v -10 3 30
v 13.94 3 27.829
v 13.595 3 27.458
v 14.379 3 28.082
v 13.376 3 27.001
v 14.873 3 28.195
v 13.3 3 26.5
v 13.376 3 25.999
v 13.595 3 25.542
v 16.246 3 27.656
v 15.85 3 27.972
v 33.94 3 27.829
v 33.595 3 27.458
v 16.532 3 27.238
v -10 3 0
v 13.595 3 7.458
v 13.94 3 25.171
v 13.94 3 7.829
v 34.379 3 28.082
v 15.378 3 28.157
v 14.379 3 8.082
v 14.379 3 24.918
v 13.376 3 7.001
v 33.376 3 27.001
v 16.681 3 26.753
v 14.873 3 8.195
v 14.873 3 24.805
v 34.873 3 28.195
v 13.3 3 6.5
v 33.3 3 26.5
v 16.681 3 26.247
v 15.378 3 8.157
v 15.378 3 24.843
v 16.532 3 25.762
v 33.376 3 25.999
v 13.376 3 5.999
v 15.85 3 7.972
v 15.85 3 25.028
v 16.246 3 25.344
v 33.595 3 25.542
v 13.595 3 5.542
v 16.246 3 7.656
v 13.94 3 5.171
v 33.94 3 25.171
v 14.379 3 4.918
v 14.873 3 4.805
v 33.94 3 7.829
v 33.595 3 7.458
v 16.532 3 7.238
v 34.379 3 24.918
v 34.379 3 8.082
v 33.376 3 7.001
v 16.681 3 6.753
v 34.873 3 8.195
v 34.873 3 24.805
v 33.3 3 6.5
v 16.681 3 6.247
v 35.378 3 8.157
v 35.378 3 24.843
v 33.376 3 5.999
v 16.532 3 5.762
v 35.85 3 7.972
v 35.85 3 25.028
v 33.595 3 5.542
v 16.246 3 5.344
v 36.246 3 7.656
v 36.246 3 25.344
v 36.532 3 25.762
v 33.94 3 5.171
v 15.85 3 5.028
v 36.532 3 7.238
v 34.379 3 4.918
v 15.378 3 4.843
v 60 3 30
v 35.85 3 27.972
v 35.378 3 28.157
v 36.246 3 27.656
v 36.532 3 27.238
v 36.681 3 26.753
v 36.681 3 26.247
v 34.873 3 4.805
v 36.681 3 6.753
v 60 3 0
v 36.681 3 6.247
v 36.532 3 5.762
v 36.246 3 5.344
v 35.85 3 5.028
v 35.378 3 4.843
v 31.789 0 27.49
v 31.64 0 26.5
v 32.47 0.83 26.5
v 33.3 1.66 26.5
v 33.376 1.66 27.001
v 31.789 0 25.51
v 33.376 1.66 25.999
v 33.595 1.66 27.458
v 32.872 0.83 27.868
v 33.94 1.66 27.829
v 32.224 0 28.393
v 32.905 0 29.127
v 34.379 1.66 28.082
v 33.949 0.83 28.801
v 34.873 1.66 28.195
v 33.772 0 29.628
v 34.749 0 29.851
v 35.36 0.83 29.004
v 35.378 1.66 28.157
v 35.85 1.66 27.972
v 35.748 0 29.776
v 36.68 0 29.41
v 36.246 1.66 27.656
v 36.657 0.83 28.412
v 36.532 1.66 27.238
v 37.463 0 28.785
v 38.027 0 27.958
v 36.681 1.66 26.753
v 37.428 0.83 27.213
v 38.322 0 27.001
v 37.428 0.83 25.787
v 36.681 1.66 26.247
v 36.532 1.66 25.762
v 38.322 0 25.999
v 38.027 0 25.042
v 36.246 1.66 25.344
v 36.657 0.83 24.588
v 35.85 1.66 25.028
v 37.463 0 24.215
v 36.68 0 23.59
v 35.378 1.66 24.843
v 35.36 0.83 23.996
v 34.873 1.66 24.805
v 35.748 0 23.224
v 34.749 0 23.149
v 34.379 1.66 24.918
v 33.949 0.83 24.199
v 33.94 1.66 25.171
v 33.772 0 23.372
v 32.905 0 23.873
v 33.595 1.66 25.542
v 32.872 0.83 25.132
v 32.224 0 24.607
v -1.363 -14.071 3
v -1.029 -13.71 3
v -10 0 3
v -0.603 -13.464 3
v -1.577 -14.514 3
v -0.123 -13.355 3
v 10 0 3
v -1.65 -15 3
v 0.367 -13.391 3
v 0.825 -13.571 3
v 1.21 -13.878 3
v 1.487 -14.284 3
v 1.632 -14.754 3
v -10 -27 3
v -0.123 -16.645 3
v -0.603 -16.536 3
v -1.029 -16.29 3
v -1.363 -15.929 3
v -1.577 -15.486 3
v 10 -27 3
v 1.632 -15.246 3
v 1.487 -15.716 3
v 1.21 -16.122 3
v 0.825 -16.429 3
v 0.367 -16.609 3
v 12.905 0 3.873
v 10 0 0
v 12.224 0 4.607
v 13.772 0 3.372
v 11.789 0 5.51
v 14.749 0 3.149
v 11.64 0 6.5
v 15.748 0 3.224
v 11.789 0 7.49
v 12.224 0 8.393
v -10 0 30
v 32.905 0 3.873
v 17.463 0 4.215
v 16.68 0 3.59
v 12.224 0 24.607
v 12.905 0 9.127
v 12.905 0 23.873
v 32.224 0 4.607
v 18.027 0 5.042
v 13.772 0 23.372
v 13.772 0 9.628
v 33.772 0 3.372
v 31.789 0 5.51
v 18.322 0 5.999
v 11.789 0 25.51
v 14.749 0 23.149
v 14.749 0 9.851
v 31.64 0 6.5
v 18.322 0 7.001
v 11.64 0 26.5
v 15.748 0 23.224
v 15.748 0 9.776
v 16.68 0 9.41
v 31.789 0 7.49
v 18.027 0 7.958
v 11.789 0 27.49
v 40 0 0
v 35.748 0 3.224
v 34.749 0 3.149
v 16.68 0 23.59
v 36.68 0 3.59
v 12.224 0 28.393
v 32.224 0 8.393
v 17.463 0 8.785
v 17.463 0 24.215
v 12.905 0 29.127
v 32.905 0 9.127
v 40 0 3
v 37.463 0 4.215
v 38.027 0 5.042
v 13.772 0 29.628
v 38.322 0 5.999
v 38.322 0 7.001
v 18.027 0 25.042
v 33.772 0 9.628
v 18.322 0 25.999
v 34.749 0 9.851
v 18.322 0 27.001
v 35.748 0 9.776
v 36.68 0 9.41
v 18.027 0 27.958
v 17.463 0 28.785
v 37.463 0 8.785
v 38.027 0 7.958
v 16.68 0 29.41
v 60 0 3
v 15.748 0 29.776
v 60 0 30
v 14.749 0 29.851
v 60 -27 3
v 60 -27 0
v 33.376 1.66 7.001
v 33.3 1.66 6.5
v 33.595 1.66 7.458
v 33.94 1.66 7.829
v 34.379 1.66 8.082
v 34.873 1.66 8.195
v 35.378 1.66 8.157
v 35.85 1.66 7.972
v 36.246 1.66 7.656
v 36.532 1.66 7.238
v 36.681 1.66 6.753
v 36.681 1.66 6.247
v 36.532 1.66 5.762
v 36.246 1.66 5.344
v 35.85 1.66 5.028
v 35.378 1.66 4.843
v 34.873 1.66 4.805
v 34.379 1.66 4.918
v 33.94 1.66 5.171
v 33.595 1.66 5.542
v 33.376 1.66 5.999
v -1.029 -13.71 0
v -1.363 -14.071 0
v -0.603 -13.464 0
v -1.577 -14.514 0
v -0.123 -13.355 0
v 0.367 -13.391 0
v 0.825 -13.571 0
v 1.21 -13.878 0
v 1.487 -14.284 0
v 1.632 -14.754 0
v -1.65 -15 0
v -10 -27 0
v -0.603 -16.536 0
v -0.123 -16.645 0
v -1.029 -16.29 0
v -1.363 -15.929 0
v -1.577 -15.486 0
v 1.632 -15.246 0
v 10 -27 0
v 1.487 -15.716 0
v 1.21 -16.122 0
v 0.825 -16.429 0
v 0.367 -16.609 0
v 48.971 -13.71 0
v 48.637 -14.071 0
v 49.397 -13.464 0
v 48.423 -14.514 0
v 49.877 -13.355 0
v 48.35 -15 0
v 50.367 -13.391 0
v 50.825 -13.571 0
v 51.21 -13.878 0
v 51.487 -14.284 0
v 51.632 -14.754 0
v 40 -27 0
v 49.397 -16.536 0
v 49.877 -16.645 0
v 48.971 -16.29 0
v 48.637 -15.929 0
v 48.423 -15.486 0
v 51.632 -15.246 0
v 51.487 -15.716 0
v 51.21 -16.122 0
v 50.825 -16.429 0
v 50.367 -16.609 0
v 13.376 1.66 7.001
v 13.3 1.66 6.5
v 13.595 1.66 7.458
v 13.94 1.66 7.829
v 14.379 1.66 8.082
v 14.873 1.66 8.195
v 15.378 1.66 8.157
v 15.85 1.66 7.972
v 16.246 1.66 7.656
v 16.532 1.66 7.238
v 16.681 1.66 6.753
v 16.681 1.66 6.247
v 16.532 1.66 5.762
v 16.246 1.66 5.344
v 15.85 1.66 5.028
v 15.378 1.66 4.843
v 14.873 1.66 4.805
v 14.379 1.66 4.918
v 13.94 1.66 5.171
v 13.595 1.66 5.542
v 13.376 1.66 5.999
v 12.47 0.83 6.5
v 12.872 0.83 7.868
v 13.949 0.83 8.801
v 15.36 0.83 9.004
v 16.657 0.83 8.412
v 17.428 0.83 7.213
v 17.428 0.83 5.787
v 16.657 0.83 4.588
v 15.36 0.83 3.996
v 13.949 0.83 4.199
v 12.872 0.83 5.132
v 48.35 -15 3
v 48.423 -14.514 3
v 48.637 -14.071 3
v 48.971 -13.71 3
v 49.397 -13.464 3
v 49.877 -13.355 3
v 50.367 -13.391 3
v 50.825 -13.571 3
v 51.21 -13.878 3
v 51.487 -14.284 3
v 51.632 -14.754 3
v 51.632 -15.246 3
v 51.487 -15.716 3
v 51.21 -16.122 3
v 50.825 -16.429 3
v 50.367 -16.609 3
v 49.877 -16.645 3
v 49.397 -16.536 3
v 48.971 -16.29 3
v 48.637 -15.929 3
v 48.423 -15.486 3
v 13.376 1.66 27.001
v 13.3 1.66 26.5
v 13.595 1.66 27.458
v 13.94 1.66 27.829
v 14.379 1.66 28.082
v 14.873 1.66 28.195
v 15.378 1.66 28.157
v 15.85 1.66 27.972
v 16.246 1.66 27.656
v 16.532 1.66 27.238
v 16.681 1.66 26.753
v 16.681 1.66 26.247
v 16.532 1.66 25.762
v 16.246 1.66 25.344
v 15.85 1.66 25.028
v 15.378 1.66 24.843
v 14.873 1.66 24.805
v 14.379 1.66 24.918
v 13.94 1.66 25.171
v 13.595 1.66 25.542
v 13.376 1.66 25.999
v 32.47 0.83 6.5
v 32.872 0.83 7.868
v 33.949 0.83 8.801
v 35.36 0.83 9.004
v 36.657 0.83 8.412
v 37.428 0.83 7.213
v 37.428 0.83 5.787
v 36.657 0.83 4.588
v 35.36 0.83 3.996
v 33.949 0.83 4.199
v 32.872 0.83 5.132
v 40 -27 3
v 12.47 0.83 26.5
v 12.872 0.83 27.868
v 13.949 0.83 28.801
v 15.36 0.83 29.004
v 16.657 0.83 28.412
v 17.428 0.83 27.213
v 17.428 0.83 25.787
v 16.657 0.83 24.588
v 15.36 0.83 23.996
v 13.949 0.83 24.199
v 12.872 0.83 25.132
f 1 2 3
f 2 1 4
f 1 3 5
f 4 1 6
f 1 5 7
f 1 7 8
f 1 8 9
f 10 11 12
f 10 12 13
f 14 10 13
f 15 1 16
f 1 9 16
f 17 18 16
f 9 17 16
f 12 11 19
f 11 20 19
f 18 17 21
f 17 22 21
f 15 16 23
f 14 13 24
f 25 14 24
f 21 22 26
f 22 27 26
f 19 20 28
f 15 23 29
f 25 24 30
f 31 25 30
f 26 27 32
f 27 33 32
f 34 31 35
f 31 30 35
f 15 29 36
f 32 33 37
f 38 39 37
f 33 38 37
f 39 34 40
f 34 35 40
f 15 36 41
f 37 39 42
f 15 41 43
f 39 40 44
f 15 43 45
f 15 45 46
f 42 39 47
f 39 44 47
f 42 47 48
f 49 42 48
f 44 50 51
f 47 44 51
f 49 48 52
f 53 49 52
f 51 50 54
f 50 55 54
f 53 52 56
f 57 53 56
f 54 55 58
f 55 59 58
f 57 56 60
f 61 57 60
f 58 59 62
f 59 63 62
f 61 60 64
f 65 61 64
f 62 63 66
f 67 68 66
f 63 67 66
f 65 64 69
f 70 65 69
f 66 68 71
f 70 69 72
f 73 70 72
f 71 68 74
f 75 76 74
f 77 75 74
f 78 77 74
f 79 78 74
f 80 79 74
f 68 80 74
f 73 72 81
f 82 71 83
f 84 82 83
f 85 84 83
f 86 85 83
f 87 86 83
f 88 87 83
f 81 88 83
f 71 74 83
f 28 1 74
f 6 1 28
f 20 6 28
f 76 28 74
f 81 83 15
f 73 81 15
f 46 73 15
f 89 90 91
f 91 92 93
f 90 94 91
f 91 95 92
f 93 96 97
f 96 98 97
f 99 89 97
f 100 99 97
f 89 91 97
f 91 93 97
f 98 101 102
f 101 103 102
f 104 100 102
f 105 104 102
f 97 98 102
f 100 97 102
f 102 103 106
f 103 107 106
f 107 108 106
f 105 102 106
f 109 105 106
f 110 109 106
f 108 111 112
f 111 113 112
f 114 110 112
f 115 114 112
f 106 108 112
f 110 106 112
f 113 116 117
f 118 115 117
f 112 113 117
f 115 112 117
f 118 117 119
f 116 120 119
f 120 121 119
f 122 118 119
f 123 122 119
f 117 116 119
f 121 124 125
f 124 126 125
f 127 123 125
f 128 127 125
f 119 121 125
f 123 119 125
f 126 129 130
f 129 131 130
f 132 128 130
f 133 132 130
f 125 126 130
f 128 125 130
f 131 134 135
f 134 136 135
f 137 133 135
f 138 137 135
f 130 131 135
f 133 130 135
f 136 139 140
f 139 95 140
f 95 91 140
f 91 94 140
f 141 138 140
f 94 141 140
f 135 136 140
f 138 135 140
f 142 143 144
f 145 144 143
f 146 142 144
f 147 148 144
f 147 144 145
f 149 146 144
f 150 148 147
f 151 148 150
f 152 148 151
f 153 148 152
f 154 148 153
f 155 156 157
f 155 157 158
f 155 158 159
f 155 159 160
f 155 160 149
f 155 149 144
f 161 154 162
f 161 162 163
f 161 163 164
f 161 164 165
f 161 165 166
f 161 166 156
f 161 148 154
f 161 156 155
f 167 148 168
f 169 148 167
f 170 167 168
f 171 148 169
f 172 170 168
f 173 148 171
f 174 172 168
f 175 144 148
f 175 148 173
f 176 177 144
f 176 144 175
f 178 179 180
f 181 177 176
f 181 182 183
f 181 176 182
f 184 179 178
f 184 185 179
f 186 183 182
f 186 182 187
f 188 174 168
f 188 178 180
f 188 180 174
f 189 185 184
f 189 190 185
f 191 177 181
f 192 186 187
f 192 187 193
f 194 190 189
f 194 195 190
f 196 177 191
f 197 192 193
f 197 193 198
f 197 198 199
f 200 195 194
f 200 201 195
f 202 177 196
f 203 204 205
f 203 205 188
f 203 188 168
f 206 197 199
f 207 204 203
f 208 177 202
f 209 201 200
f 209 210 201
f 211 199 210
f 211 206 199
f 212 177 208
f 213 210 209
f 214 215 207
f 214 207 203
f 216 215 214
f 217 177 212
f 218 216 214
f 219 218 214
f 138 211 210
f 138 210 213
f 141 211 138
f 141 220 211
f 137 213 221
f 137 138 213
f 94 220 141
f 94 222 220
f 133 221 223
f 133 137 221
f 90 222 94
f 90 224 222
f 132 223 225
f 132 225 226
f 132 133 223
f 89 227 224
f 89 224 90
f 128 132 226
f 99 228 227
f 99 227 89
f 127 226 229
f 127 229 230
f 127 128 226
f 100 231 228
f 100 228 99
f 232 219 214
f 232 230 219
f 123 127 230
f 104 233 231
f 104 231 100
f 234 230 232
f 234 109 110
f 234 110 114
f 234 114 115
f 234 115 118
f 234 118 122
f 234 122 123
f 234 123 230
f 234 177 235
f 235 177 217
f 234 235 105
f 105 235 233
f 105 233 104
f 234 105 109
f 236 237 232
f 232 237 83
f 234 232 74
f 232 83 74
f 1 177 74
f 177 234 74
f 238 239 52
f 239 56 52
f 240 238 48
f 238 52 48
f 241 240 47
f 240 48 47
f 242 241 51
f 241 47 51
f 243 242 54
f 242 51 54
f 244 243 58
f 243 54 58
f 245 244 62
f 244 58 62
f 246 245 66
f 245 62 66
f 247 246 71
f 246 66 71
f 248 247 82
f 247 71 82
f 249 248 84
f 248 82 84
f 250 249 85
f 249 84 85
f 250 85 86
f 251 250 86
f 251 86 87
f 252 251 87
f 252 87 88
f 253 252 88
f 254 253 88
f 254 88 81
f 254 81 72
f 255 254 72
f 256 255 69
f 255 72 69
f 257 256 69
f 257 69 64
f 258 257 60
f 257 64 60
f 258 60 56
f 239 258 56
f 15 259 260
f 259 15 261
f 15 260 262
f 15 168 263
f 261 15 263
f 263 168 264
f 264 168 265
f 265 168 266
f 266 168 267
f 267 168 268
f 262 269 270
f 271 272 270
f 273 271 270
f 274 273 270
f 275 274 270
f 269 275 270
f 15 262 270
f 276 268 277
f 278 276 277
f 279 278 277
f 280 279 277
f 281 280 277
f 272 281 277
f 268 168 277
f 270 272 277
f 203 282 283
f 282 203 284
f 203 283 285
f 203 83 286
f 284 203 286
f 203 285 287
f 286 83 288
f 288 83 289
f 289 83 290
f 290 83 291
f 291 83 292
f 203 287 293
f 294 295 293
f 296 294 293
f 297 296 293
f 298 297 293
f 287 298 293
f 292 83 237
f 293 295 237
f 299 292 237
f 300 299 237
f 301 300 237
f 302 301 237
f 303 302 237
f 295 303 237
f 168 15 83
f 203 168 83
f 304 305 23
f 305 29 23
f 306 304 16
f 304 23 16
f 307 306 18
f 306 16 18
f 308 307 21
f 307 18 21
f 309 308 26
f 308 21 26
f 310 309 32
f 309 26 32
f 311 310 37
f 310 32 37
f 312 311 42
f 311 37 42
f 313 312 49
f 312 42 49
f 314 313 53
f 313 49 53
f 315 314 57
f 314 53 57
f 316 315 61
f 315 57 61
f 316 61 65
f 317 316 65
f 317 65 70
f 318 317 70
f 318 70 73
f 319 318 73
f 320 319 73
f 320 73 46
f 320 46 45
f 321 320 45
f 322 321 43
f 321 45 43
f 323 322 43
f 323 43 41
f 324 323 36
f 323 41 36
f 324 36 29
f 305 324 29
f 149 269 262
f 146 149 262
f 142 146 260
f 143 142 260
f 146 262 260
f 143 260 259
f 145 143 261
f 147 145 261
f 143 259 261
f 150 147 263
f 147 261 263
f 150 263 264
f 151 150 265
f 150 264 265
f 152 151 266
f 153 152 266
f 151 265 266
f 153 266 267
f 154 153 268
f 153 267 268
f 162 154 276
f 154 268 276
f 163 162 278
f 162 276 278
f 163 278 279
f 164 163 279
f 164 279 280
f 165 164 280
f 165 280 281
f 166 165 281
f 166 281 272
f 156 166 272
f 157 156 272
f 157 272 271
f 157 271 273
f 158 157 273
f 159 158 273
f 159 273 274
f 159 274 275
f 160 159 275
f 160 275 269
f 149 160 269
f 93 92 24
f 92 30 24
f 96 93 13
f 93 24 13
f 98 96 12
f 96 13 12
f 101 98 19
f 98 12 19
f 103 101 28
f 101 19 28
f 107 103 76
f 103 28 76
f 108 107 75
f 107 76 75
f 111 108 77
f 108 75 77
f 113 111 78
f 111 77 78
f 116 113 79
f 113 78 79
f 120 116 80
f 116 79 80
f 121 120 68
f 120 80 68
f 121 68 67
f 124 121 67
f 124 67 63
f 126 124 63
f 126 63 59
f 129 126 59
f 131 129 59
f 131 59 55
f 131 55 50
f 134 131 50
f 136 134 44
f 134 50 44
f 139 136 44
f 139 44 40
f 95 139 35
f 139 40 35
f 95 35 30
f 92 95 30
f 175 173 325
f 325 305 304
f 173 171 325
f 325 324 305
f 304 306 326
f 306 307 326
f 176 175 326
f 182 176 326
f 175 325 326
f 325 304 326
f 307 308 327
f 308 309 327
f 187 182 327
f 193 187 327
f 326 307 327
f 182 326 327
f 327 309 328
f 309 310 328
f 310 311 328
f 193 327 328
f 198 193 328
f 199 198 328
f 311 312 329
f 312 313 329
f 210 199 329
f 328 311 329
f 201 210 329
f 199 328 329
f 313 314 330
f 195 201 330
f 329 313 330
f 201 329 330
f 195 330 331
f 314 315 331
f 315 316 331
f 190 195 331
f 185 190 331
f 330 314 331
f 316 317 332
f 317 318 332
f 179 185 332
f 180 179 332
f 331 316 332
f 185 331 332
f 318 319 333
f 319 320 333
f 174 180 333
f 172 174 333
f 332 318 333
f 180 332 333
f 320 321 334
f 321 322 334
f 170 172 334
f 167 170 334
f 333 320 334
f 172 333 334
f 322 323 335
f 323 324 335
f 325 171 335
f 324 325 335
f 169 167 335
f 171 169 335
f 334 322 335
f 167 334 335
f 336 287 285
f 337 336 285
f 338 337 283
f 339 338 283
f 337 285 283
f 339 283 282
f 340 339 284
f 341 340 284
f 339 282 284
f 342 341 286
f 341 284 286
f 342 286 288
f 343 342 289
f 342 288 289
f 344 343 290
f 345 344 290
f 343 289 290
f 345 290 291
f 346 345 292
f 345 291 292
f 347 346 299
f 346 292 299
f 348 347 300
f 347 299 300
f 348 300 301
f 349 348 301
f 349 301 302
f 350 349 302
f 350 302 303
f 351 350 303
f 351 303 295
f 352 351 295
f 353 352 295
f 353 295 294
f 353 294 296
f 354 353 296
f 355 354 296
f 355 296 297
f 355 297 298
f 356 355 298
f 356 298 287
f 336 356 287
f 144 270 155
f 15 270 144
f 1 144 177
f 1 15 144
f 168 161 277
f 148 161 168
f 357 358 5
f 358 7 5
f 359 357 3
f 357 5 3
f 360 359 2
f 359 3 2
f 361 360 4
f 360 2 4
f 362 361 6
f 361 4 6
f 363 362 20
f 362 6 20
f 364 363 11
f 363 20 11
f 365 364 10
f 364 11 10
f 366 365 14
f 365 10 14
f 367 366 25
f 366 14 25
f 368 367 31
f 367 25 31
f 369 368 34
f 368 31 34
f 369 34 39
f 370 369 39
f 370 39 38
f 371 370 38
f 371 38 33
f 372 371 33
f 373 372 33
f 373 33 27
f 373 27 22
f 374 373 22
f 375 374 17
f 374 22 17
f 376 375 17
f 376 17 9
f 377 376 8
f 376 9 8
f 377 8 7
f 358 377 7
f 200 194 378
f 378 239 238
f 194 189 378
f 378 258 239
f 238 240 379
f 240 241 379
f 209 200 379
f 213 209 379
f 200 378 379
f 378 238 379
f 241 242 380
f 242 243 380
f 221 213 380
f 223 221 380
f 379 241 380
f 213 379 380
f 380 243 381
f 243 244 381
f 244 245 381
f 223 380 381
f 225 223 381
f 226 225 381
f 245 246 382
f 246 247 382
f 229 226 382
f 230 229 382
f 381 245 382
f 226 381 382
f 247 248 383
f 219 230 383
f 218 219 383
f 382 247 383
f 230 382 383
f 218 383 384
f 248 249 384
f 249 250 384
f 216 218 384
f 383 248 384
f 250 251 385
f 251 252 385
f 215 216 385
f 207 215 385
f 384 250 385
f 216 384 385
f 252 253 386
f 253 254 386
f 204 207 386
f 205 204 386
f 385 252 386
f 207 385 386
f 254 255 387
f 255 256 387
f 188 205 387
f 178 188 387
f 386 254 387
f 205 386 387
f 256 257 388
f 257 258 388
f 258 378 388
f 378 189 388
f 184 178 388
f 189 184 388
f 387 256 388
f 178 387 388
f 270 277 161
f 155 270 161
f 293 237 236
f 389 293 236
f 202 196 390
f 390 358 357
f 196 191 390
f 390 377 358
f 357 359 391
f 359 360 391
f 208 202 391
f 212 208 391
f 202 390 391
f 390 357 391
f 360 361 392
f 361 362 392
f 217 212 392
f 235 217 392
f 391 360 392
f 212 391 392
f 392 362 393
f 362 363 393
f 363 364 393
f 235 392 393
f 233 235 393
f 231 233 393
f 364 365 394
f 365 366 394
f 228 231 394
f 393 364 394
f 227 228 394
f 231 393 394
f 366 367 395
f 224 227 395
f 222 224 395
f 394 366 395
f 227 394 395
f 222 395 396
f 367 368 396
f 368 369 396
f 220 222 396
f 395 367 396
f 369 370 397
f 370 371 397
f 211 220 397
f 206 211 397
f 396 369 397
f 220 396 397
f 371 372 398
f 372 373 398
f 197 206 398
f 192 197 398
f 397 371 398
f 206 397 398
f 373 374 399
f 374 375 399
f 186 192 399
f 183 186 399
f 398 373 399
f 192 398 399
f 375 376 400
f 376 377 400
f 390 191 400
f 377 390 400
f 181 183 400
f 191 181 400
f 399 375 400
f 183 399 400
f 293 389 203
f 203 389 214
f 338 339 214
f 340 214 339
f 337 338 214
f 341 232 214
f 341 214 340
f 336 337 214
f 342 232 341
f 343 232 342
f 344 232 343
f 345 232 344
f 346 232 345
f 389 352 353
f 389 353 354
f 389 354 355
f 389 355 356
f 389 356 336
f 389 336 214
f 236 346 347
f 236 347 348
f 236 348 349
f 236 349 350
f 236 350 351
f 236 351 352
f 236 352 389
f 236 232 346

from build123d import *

# Parameters (mm, degrees)
F0_W           = 50
F0_H           = 27
F1_DEPTH       = 3
F2_D           = 3.4
F2_DEPTH       = 5
F2_CSINK_D     = 6.72
F2_CSINK_ANGLE = 90
F2_TIP         = 1.0214630523
F3_DEPTH       = 3
F0_H_2         = 3
F4_DEPTH       = 27
F5_DEPTH       = 10
F6_DEPTH       = 10
F7_W           = 30
F7_H           = 27
F8_DEPTH       = 7
F9_D           = 3.3
F9_DEPTH       = 14.1
F9_TIP         = 0.9914200214


with BuildPart() as f1:
    # F0 (on Front) → F1 (new body)
    with BuildSketch(Plane.XZ):
        with Locations((25, 16.5)):
            Rectangle(F0_W, F0_H)
    extrude(amount=-F1_DEPTH)

    # F2
    with Locations(Plane.XZ):
        with Locations((35, 26.5), (15, 26.5), (15, 6.5), (35, 6.5)):
            CounterSinkHole(F2_D / 2, F2_CSINK_D / 2, depth=F2_DEPTH, counter_sink_angle=F2_CSINK_ANGLE)
            with Locations((0, 0, -(F2_DEPTH + F2_TIP / 2))):  # 118° drill point
                Cone(0, F2_D / 2, F2_TIP, mode=Mode.SUBTRACT)

    # F3 (add): a face of the model
    f3_faces = [f1.faces().sort_by_distance(p)[0] for p in [
        (25, 1.5, 3),
    ]]
    extrude(f3_faces, amount=F3_DEPTH)

    # F0 (on Front) → F4 (join)
    with BuildSketch(Plane.XZ):
        with Locations((25, 1.5)):
            Rectangle(F0_W, F0_H_2)
    extrude(amount=F4_DEPTH)

    # F5 (add): a face of the model
    f5_faces = [f1.faces().sort_by_distance(p)[0] for p in [
        (50, 1.5, 29.5757359313),
    ]]
    extrude(f5_faces, amount=F5_DEPTH)

    # F6 (add): a face of the model
    f6_faces = [f1.faces().sort_by_distance(p)[0] for p in [
        (0, 1.5, 29.5757359313),
    ]]
    extrude(f6_faces, amount=F6_DEPTH)

    # F7 (on face) → F8 (cut)
    with BuildSketch(Plane.XY.offset(3)):
        with Locations((25, -13.5)):
            Rectangle(F7_W, F7_H)
    extrude(amount=-F8_DEPTH, mode=Mode.SUBTRACT)

    # F9
    with Locations(Plane.XY.offset(3)):
        with Locations((0, -15), (50, -15)):
            Hole(F9_D / 2, depth=F9_DEPTH)
            with Locations((0, 0, -(F9_DEPTH + F9_TIP / 2))):  # 118° drill point
                Cone(0, F9_D / 2, F9_TIP, mode=Mode.SUBTRACT)


solid = f1.part
